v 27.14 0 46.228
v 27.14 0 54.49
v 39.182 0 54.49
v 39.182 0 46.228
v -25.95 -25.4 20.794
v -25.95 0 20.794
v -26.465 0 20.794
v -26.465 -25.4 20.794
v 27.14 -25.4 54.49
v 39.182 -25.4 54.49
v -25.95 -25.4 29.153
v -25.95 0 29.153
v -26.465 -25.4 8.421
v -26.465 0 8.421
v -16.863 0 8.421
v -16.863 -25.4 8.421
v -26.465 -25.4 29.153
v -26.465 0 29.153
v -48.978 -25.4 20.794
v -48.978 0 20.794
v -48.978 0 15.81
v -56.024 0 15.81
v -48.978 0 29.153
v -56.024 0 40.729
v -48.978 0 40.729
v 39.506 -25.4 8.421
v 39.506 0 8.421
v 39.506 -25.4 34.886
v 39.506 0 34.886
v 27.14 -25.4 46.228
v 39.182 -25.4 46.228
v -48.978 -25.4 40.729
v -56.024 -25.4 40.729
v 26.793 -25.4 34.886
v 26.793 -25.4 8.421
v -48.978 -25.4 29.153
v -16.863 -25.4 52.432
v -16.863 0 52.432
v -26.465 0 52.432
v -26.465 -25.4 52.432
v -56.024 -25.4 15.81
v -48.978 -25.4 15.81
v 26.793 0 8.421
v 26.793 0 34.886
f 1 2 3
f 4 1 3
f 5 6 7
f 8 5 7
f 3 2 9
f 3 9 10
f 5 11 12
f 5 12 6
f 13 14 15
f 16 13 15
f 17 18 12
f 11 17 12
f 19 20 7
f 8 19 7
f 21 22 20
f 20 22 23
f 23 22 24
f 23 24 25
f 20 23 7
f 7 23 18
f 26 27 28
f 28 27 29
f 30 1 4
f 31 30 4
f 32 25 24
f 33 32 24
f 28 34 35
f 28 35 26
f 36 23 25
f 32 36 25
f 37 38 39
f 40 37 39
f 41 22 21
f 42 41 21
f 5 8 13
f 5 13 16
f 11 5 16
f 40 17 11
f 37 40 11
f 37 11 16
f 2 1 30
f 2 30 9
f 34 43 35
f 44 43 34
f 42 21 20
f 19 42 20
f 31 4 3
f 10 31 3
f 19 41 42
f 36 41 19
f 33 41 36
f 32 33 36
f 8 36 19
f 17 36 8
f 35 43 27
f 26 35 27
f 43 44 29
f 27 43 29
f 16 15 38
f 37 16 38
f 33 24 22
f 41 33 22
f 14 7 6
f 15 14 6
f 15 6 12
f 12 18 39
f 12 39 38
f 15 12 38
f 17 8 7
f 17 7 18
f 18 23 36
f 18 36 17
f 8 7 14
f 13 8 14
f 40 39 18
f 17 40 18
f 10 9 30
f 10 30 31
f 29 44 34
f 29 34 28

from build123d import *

# Parameters (mm, degrees)
F0_W     = 44.4966894574
F0_H     = 142.6403382793
F3_DEPTH = 99.9430287629
F2_W     = 12.7120167017
F2_H     = 26.4651998878
F4_DEPTH = 25.4
F2_W_2   = 12.0422691107
F2_H_2   = 8.2615166903
F2_W_3   = 22.5125998259
F2_H_3   = 8.3593800664


with BuildPart() as f3:
    # F0 (on Front) → F3 (new body)
    with BuildSketch(Plane.XZ):
        with Locations((25.8182415273, 74.7748683207)):
            Rectangle(F0_W, F0_H)
    extrude(amount=F3_DEPTH)


with BuildPart() as f4:
    # F2 (on Front) → F4 (new body)
    with BuildSketch(Plane.XZ):
        with Locations((33.1495031714, 21.6533355415)):
            Rectangle(F2_W, F2_H)
    extrude(amount=F4_DEPTH)


with BuildPart() as f4b:
    # F2 (on Front) → F4, piece 2 (new body)
    with BuildSketch(Plane.XZ):
        with Locations((33.161111176, 50.3589212894)):
            Rectangle(F2_W_2, F2_H_2)
    extrude(amount=F4_DEPTH)


with BuildPart() as f4c:
    # F2 (on Front) → F4, piece 3 (new body)
    with BuildSketch(Plane.XZ):
        Polygon((-26.4651924372, 52.4320825934), (-26.4651924372, 29.1534587741), (-25.9496346116, 29.1534587741), (-25.9496346116, 20.7940787077), (-26.4651924372, 20.7940787077), (-26.4651924372, 8.4207355976), (-16.8632790446, 8.4207355976), (-16.8632790446, 52.4320825934), align=None)
    extrude(amount=F4_DEPTH)


with BuildPart() as f4d:
    # F2 (on Front) → F4, piece 4 (new body)
    with BuildSketch(Plane.XZ):
        Polygon((-48.977792263, 40.7288968563), (-56.0237169266, 40.7288968563), (-56.0237169266, 15.8103704453), (-48.977792263, 15.8103704453), (-48.977792263, 20.7940787077), (-48.977792263, 29.1534587741), align=None)
        with Locations((-37.7214923501, 24.9737687409)):
            Rectangle(F2_W_3, F2_H_3)
    extrude(amount=F4_DEPTH)


solid = Compound([f4.part, f4b.part, f4c.part, f4d.part])
